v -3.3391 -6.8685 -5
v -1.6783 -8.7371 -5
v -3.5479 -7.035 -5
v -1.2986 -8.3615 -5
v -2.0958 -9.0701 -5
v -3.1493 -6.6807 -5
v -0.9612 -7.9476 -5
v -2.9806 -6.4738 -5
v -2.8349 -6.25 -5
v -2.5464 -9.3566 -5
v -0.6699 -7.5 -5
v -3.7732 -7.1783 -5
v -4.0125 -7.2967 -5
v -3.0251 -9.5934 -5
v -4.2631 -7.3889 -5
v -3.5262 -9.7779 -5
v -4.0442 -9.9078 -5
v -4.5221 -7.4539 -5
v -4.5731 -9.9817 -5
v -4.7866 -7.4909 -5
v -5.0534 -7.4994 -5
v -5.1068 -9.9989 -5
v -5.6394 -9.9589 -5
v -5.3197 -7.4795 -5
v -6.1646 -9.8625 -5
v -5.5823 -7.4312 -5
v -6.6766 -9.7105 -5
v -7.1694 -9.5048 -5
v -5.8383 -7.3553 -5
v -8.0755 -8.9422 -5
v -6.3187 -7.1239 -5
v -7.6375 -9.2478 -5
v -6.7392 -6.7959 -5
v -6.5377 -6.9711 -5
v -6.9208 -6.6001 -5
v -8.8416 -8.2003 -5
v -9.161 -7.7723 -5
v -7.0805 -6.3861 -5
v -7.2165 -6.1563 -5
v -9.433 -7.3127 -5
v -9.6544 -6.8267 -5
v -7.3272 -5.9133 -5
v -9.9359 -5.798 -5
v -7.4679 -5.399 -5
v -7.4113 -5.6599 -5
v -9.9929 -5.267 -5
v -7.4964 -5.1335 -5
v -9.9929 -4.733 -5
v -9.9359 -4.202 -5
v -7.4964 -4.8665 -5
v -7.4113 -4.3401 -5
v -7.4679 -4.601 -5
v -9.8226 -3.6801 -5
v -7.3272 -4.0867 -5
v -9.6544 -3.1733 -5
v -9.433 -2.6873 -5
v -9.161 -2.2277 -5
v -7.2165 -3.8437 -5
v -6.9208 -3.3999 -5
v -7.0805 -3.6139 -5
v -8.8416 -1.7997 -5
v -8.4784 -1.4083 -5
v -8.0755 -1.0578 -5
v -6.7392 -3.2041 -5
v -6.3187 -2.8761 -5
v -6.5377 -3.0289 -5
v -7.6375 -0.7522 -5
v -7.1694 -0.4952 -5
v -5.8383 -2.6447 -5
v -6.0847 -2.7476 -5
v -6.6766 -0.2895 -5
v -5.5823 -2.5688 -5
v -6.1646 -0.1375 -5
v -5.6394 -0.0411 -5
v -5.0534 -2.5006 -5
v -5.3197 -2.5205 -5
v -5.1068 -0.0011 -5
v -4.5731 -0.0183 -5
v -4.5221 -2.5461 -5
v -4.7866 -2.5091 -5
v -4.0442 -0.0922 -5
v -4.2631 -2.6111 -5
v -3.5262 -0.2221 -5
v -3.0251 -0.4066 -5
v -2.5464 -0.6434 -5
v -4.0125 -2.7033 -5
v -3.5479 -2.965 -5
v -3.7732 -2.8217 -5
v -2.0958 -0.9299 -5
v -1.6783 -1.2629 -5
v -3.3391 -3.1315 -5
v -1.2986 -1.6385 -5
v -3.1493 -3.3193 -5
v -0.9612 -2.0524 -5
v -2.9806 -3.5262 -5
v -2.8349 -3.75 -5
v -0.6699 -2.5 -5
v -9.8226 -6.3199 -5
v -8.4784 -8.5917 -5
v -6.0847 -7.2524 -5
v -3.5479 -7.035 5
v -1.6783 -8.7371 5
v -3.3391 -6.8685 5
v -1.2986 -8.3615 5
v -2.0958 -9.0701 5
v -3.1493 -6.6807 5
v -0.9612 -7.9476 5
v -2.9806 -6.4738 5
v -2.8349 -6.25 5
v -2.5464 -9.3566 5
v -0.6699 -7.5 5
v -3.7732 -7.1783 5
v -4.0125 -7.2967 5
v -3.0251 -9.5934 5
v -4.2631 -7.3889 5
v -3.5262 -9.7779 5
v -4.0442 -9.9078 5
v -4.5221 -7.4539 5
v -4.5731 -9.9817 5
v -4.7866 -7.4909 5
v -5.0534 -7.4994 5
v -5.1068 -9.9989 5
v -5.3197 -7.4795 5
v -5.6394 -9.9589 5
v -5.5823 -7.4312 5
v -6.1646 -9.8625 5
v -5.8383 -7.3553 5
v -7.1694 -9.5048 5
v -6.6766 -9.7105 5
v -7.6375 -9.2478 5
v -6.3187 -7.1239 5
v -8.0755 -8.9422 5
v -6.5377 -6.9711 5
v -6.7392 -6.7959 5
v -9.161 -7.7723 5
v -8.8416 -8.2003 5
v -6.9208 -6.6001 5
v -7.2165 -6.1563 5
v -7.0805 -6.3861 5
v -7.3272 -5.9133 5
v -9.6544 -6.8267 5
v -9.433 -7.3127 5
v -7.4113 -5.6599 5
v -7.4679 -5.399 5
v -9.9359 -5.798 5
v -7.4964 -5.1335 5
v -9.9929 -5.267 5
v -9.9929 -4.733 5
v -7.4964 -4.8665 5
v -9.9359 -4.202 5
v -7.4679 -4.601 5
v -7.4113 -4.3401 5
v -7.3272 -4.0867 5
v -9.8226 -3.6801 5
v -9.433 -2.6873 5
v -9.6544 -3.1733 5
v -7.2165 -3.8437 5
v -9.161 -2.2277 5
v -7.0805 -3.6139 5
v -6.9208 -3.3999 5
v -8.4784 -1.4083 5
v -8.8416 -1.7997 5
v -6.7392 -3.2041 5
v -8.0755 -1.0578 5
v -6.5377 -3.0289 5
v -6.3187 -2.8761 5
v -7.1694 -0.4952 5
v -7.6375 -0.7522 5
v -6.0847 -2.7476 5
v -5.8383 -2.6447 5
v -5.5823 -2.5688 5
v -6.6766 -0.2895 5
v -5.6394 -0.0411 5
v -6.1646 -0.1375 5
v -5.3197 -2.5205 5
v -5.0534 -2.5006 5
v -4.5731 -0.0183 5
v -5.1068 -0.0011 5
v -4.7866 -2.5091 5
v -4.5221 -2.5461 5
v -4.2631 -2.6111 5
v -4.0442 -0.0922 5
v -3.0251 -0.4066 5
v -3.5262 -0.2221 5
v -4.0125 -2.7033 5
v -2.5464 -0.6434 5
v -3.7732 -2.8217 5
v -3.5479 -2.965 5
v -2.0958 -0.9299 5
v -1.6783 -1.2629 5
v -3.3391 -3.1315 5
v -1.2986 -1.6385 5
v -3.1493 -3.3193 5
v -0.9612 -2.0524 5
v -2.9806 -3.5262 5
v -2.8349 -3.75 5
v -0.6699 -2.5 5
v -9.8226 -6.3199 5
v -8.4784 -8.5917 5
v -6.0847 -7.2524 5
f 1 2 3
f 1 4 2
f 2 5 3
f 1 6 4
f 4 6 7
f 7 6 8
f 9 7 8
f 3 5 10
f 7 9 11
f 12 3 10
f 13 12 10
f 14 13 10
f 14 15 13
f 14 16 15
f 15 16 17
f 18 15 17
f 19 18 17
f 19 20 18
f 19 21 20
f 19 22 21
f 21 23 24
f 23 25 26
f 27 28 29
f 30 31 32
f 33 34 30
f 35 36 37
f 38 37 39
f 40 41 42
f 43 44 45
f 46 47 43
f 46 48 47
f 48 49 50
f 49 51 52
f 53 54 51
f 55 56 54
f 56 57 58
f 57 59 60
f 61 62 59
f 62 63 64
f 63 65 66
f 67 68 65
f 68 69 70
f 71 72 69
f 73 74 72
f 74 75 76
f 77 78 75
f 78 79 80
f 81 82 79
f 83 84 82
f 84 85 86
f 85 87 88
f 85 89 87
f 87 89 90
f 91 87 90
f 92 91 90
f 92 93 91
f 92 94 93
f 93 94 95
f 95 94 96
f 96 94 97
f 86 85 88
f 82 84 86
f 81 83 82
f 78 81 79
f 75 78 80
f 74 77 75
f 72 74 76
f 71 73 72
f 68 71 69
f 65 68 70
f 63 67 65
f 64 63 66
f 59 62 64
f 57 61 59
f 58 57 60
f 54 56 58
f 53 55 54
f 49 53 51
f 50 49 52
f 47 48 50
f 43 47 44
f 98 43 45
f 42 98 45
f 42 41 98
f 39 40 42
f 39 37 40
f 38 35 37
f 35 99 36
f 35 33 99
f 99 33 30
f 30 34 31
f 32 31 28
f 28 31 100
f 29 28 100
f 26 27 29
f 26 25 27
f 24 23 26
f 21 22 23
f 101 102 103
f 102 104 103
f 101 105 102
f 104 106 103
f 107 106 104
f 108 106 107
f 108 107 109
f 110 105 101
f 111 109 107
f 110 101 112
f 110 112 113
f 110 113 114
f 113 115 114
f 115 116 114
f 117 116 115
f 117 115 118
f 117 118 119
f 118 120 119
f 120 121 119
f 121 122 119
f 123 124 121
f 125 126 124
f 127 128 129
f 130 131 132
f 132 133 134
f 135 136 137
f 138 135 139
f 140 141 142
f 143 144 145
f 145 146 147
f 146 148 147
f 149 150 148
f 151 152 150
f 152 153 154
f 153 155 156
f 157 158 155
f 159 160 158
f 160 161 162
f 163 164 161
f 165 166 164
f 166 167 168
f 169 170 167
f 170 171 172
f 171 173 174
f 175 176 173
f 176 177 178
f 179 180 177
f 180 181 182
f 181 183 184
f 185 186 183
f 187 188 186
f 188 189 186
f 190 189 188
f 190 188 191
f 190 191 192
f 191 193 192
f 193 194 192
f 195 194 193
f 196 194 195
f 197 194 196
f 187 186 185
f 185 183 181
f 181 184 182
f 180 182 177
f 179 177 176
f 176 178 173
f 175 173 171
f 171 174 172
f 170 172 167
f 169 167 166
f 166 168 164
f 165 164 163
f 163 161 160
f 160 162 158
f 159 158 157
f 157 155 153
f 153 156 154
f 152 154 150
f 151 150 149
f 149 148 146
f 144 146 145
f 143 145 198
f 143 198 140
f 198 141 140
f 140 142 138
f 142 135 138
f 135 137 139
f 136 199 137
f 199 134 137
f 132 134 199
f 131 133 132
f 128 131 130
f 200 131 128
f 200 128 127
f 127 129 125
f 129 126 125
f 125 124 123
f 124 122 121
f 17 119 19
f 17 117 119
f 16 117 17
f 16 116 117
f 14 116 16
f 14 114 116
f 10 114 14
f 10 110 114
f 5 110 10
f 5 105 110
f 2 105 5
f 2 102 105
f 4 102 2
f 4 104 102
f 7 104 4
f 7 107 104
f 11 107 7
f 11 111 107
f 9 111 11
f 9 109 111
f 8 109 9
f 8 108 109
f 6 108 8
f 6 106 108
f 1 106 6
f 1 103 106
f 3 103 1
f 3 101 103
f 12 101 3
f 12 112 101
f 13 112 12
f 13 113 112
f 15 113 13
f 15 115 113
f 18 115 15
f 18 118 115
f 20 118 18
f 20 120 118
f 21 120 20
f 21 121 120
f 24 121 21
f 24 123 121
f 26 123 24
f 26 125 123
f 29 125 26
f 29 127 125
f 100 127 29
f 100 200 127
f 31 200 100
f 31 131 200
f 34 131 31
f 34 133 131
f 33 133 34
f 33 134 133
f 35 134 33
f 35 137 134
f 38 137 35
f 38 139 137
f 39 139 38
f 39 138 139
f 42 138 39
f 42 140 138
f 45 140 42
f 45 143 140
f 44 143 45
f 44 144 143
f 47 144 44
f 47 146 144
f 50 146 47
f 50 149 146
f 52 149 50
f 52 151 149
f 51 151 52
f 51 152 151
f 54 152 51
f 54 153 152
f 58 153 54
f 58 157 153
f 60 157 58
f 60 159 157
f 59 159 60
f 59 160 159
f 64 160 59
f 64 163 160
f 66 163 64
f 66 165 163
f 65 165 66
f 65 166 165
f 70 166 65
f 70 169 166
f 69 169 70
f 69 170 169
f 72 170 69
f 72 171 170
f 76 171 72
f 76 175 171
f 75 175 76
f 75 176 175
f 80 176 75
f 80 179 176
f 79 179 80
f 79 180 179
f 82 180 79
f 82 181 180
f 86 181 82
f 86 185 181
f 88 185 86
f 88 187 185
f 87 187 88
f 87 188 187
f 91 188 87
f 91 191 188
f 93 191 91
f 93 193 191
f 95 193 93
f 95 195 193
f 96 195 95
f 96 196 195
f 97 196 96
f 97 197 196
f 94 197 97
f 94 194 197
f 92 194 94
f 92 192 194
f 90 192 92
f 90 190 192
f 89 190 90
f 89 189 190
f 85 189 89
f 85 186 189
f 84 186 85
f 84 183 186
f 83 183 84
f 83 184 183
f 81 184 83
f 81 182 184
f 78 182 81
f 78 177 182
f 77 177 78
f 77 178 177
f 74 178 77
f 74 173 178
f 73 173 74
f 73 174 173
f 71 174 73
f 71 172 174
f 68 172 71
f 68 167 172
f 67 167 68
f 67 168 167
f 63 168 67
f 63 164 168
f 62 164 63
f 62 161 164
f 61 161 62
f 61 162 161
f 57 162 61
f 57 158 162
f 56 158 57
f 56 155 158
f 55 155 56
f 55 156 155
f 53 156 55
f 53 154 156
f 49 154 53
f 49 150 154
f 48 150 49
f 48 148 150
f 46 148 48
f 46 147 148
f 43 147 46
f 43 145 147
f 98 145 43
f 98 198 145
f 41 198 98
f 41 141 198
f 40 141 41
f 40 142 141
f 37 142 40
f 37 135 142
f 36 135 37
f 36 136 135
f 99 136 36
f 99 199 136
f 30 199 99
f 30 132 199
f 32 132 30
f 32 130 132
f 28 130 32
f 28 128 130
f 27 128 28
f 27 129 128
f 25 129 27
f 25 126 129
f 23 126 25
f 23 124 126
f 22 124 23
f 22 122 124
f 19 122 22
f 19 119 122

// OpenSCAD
// Generated by SolidPython 1.1.3 on 2025-02-20 03:31:40
$fn=50;


translate(v = [-5.0000000000, -5.0000000000, -5.0000000000]) {
	linear_extrude(height = 10) {
		polygon(points = [[4.3301270189, 2.5000000000], [4.0387948484, 2.9475644476], [3.7013899854, 3.3615044513], [3.3217613875, 3.7370979763], [2.9042396813, 4.0700604263], [2.4535877600, 4.3565935206], [1.9749464512, 4.5934286231], [1.4737758721, 4.7778640289], [0.9557931435, 4.9077957850], [0.4269071715, 4.9817416901], [-0.1068487589, 4.9988582039], [-0.6393858084, 4.9589500691], [-1.1646290421, 4.8624725392], [-1.6765867295, 4.7105261849], [-2.1694186956, 4.5048443395], [-2.6375029425, 4.2477733259], [-3.0754997831, 3.9422456905], [-3.4784127530, 3.5917467505], [-3.8416456087, 3.2002748347], [-4.1610547586, 2.7722956725], [-4.4329965319, 2.3126914512], [-4.6543687432, 1.8267051218], [-4.8226460815, 1.3198805903], [-4.9359089171, 0.7979994752], [-4.9928652003, 0.2670151533], [-4.9928652003, -0.2670151533], [-4.9359089171, -0.7979994752], [-4.8226460815, -1.3198805903], [-4.6543687432, -1.8267051218], [-4.4329965319, -2.3126914512], [-4.1610547586, -2.7722956725], [-3.8416456087, -3.2002748347], [-3.4784127530, -3.5917467505], [-3.0754997831, -3.9422456905], [-2.6375029425, -4.2477733259], [-2.1694186956, -4.5048443395], [-1.6765867295, -4.7105261849], [-1.1646290421, -4.8624725392], [-0.6393858084, -4.9589500691], [-0.1068487589, -4.9988582039], [0.4269071715, -4.9817416901], [0.9557931435, -4.9077957850], [1.4737758721, -4.7778640289], [1.9749464512, -4.5934286231], [2.4535877600, -4.3565935206], [2.9042396813, -4.0700604263], [3.3217613875, -3.7370979763], [3.7013899854, -3.3615044513], [4.0387948484, -2.9475644476], [4.3301270189, -2.5000000000], [2.1650635095, -1.2500000000], [2.0193974242, -1.4737822238], [1.8506949927, -1.6807522257], [1.6608806938, -1.8685489881], [1.4521198406, -2.0350302131], [1.2267938800, -2.1782967603], [0.9874732256, -2.2967143115], [0.7368879360, -2.3889320145], [0.4778965718, -2.4538978925], [0.2134535857, -2.4908708451], [-0.0534243795, -2.4994291020], [-0.3196929042, -2.4794750346], [-0.5823145210, -2.4312362696], [-0.8382933648, -2.3552630924], [-1.0847093478, -2.2524221698], [-1.3187514713, -2.1238866629], [-1.5377498915, -1.9711228453], [-1.7392063765, -1.7958733752], [-1.9208228043, -1.6001374173], [-2.0805273793, -1.3861478363], [-2.2164982659, -1.1563457256], [-2.3271843716, -0.9133525609], [-2.4113230407, -0.6599402952], [-2.4679544585, -0.3989997376], [-2.4964326001, -0.1335075766], [-2.4964326001, 0.1335075766], [-2.4679544585, 0.3989997376], [-2.4113230407, 0.6599402952], [-2.3271843716, 0.9133525609], [-2.2164982659, 1.1563457256], [-2.0805273793, 1.3861478363], [-1.9208228043, 1.6001374173], [-1.7392063765, 1.7958733752], [-1.5377498915, 1.9711228453], [-1.3187514713, 2.1238866629], [-1.0847093478, 2.2524221698], [-0.8382933648, 2.3552630924], [-0.5823145210, 2.4312362696], [-0.3196929042, 2.4794750346], [-0.0534243795, 2.4994291020], [0.2134535857, 2.4908708451], [0.4778965718, 2.4538978925], [0.7368879360, 2.3889320145], [0.9874732256, 2.2967143115], [1.2267938800, 2.1782967603], [1.4521198406, 2.0350302131], [1.6608806938, 1.8685489881], [1.8506949927, 1.6807522257], [2.0193974242, 1.4737822238], [2.1650635095, 1.2500000000]]);
	}
}
/***********************************************
*********      SolidPython code:      **********
************************************************
 
from solid import *
from solid.utils import *

import math
import matplotlib.pyplot as plt
import subprocess
import os

class Hole:
    def __init__(self, x, y, radius):
        """
        Hole defined by:
        :param x: x dimension for center point of the circle as a ratio of letter height
        :param y: y dimension for center point of the circle as a ratio of letter height
        :param radius: radius of circle as a ratio of letter height
        """
        self.x = x
        self.y = y
        self.radius = radius

class Letter3D:
    def __init__(self, name, outer_shape_points, height, holes=None):
        """
        3D Letter defined by:
        :param name: name of letter
        :param outer_shape_points: points defining the outer shape of the letter
        :param heigh: size of cube that letter fits inside
        :param holes: list of Holes
        """
        self.name = name
        self.outer_shape_points = outer_shape_points
        self.holes = holes if holes is None else []
        self.height = height
        self.shape = self.generate()


    def generate(self):
        shape = polygon(points=self.outer_shape_points)

        if self.holes:
            for hole in self.holes:
                circle_hole = circle(r=hole.radius*self.height)
                positioned_hole = translate([hole.x*self.height, hole.y*self.height])(circle_hole)
                shape = difference()(shape, positioned_hole)
        
        shape_3d = linear_extrude(height=self.height)(shape)
        shape_3d = translate([-self.height/2, -self.height/2, -self.height/2])(shape_3d)
        return shape_3d
    
    def render(self):
        scad_render_to_file(self.shape, f"output/{self.name}.scad", file_header='$fn=50;')
        subprocess.run(["C:\\Program Files\\OpenSCAD\\openscad.exe", "-o", f"output\\{self.name}.stl", f"output\\{self.name}.scad"])


class TwoLetter3D:
    def __init__(self, height, letterA, letterB, letterA_face, letterB_face):
        self.height = height
        self.letterA = letterA
        self.letterB = letterB
        self.letterA_face = letterA_face
        self.letterB_face = letterB_face

    def call_letter_generation(self, letter):
        letter = letter.upper()
        function_name = f"letter_{letter}"
        func = globals().get(function_name)
        if func is None:
            raise ValueError(f"No letter generation function defined for letter '{letter}'.")
        else:
            print(func)
        return func(self.height)
    
    def rotate_object(self, face, shape):
        face = face.lower()
        if face == "z":
            return shape
        if face == "x":
            return rotate(a=90, v=[0,1,0])(shape)
        if face == "y":
            return rotate(a=-90, v=[1,0,0])(shape)
        else:
            raise ValueError("Face must be one of 'x', 'y', or 'z'.")

    def render(self):
        letterA3D = self.call_letter_generation(self.letterA)
        print(letterA3D)
        # letterA3D = self.rotate_object(self.letterA_face, letterA3D)

        # letterB3D = self.call_letter_generation(self.letterB)
        # # letterB3D = self.rotate_object(self.letterB_face, letterB3D)

        # combined = intersection()(letterA3D, letterB3D)
        # file_name = self.letterA + self.letterB
        file_name = "testA"
        scad_render_to_file(letterA3D, f"output/{file_name}.scad", file_header='$fn=50;')
        subprocess.run(["C:\\Program Files\\OpenSCAD\\openscad.exe", "-o", f"output\\{file_name}.stl", f"output\\{file_name}.scad"])
    
                

def arc_points(radius, start_angle, end_angle, center=[0,0], num_points=50):
    angles = [start_angle + i * (end_angle - start_angle) / (num_points - 1)
              for i in range(num_points)]
    points = [
        (center[0] + radius * math.cos(math.radians(angle)),
         center[1] + radius * math.sin(math.radians(angle)))
        for angle in angles
    ]
    return points

def letter_A(h):
    shape_points = [(0,0), (h/2, h), (h, 0), (5/6*h, 0), (2/3*h, 1/3*h), (1/3*h, 1/3*h), (h/6, 0)]
    holes = [Hole(1/2, 7/12, 1/6)]
    A = Letter3D("A", shape_points, h, holes)
    return A.generate()


def letter_B(h):
    top_arc_points = arc_points(h/4, 90, -90, center=[3/4*h, 3/4*h])
    bottom_arc_points = arc_points(h/4, 90, -90, center=[3/4*h, h/4])
    other_points = [(0,0),(0,h)]

    shape_points = top_arc_points + bottom_arc_points + other_points
    holes = [Hole(1/2, 3/4, 1/6), Hole(1/2, 1/4, 1/6)]
    B = Letter3D("B", shape_points, h, holes)
    return B.generate()

def letter_C(h):
    outer_arc_points = arc_points(h/2, 30, 330)
    inner_arc_points = arc_points(h/4, 30, 330)[::-1]
    shape_points = outer_arc_points + inner_arc_points
    C = Letter3D("C", shape_points, h)
    return C.generate()


def letter_D(h):
    outer_arc_points = arc_points(h/2, 90, -90, center= [h/2, h/2])
    shape_points = outer_arc_points + [(0,0), (0, h)]
    holes = [Hole(1/2, 1/2, 1/6)]
    D = Letter3D("D", shape_points, h, holes)
    return D.generate()

def letter_E(h):
    points = [(0,0), (h,0), (h,h/5), (h/5,h/5), (h/5,2/5*h), (3/4*h,2/5*h), (3/4*h,3/5*h), (h/5,3/5*h), (h/5,4/5*h), (h,4/5*h), (h,h), (0,h)]
    E = Letter3D("E", points, h)
    return E.generate()

def letter_F(h):
    points = [(0,0), (h/5,0), (h/5,2/5*h), (3/4*h,2/5*h), (3/4*h,3/5*h), (h/5,3/5*h), (h/5,4/5*h), (h,4/5*h), (h,h), (0,h)]
    F = Letter3D("F", points, h)
    return F.generate()

if __name__ == "__main__":
    os.makedirs("output", exist_ok=True)

    # Just the letter B
    # letter_F(10)
    shape = TwoLetter3D(10, "C", "D", "x", "y")
    shape.render()
 
 
************************************************/
